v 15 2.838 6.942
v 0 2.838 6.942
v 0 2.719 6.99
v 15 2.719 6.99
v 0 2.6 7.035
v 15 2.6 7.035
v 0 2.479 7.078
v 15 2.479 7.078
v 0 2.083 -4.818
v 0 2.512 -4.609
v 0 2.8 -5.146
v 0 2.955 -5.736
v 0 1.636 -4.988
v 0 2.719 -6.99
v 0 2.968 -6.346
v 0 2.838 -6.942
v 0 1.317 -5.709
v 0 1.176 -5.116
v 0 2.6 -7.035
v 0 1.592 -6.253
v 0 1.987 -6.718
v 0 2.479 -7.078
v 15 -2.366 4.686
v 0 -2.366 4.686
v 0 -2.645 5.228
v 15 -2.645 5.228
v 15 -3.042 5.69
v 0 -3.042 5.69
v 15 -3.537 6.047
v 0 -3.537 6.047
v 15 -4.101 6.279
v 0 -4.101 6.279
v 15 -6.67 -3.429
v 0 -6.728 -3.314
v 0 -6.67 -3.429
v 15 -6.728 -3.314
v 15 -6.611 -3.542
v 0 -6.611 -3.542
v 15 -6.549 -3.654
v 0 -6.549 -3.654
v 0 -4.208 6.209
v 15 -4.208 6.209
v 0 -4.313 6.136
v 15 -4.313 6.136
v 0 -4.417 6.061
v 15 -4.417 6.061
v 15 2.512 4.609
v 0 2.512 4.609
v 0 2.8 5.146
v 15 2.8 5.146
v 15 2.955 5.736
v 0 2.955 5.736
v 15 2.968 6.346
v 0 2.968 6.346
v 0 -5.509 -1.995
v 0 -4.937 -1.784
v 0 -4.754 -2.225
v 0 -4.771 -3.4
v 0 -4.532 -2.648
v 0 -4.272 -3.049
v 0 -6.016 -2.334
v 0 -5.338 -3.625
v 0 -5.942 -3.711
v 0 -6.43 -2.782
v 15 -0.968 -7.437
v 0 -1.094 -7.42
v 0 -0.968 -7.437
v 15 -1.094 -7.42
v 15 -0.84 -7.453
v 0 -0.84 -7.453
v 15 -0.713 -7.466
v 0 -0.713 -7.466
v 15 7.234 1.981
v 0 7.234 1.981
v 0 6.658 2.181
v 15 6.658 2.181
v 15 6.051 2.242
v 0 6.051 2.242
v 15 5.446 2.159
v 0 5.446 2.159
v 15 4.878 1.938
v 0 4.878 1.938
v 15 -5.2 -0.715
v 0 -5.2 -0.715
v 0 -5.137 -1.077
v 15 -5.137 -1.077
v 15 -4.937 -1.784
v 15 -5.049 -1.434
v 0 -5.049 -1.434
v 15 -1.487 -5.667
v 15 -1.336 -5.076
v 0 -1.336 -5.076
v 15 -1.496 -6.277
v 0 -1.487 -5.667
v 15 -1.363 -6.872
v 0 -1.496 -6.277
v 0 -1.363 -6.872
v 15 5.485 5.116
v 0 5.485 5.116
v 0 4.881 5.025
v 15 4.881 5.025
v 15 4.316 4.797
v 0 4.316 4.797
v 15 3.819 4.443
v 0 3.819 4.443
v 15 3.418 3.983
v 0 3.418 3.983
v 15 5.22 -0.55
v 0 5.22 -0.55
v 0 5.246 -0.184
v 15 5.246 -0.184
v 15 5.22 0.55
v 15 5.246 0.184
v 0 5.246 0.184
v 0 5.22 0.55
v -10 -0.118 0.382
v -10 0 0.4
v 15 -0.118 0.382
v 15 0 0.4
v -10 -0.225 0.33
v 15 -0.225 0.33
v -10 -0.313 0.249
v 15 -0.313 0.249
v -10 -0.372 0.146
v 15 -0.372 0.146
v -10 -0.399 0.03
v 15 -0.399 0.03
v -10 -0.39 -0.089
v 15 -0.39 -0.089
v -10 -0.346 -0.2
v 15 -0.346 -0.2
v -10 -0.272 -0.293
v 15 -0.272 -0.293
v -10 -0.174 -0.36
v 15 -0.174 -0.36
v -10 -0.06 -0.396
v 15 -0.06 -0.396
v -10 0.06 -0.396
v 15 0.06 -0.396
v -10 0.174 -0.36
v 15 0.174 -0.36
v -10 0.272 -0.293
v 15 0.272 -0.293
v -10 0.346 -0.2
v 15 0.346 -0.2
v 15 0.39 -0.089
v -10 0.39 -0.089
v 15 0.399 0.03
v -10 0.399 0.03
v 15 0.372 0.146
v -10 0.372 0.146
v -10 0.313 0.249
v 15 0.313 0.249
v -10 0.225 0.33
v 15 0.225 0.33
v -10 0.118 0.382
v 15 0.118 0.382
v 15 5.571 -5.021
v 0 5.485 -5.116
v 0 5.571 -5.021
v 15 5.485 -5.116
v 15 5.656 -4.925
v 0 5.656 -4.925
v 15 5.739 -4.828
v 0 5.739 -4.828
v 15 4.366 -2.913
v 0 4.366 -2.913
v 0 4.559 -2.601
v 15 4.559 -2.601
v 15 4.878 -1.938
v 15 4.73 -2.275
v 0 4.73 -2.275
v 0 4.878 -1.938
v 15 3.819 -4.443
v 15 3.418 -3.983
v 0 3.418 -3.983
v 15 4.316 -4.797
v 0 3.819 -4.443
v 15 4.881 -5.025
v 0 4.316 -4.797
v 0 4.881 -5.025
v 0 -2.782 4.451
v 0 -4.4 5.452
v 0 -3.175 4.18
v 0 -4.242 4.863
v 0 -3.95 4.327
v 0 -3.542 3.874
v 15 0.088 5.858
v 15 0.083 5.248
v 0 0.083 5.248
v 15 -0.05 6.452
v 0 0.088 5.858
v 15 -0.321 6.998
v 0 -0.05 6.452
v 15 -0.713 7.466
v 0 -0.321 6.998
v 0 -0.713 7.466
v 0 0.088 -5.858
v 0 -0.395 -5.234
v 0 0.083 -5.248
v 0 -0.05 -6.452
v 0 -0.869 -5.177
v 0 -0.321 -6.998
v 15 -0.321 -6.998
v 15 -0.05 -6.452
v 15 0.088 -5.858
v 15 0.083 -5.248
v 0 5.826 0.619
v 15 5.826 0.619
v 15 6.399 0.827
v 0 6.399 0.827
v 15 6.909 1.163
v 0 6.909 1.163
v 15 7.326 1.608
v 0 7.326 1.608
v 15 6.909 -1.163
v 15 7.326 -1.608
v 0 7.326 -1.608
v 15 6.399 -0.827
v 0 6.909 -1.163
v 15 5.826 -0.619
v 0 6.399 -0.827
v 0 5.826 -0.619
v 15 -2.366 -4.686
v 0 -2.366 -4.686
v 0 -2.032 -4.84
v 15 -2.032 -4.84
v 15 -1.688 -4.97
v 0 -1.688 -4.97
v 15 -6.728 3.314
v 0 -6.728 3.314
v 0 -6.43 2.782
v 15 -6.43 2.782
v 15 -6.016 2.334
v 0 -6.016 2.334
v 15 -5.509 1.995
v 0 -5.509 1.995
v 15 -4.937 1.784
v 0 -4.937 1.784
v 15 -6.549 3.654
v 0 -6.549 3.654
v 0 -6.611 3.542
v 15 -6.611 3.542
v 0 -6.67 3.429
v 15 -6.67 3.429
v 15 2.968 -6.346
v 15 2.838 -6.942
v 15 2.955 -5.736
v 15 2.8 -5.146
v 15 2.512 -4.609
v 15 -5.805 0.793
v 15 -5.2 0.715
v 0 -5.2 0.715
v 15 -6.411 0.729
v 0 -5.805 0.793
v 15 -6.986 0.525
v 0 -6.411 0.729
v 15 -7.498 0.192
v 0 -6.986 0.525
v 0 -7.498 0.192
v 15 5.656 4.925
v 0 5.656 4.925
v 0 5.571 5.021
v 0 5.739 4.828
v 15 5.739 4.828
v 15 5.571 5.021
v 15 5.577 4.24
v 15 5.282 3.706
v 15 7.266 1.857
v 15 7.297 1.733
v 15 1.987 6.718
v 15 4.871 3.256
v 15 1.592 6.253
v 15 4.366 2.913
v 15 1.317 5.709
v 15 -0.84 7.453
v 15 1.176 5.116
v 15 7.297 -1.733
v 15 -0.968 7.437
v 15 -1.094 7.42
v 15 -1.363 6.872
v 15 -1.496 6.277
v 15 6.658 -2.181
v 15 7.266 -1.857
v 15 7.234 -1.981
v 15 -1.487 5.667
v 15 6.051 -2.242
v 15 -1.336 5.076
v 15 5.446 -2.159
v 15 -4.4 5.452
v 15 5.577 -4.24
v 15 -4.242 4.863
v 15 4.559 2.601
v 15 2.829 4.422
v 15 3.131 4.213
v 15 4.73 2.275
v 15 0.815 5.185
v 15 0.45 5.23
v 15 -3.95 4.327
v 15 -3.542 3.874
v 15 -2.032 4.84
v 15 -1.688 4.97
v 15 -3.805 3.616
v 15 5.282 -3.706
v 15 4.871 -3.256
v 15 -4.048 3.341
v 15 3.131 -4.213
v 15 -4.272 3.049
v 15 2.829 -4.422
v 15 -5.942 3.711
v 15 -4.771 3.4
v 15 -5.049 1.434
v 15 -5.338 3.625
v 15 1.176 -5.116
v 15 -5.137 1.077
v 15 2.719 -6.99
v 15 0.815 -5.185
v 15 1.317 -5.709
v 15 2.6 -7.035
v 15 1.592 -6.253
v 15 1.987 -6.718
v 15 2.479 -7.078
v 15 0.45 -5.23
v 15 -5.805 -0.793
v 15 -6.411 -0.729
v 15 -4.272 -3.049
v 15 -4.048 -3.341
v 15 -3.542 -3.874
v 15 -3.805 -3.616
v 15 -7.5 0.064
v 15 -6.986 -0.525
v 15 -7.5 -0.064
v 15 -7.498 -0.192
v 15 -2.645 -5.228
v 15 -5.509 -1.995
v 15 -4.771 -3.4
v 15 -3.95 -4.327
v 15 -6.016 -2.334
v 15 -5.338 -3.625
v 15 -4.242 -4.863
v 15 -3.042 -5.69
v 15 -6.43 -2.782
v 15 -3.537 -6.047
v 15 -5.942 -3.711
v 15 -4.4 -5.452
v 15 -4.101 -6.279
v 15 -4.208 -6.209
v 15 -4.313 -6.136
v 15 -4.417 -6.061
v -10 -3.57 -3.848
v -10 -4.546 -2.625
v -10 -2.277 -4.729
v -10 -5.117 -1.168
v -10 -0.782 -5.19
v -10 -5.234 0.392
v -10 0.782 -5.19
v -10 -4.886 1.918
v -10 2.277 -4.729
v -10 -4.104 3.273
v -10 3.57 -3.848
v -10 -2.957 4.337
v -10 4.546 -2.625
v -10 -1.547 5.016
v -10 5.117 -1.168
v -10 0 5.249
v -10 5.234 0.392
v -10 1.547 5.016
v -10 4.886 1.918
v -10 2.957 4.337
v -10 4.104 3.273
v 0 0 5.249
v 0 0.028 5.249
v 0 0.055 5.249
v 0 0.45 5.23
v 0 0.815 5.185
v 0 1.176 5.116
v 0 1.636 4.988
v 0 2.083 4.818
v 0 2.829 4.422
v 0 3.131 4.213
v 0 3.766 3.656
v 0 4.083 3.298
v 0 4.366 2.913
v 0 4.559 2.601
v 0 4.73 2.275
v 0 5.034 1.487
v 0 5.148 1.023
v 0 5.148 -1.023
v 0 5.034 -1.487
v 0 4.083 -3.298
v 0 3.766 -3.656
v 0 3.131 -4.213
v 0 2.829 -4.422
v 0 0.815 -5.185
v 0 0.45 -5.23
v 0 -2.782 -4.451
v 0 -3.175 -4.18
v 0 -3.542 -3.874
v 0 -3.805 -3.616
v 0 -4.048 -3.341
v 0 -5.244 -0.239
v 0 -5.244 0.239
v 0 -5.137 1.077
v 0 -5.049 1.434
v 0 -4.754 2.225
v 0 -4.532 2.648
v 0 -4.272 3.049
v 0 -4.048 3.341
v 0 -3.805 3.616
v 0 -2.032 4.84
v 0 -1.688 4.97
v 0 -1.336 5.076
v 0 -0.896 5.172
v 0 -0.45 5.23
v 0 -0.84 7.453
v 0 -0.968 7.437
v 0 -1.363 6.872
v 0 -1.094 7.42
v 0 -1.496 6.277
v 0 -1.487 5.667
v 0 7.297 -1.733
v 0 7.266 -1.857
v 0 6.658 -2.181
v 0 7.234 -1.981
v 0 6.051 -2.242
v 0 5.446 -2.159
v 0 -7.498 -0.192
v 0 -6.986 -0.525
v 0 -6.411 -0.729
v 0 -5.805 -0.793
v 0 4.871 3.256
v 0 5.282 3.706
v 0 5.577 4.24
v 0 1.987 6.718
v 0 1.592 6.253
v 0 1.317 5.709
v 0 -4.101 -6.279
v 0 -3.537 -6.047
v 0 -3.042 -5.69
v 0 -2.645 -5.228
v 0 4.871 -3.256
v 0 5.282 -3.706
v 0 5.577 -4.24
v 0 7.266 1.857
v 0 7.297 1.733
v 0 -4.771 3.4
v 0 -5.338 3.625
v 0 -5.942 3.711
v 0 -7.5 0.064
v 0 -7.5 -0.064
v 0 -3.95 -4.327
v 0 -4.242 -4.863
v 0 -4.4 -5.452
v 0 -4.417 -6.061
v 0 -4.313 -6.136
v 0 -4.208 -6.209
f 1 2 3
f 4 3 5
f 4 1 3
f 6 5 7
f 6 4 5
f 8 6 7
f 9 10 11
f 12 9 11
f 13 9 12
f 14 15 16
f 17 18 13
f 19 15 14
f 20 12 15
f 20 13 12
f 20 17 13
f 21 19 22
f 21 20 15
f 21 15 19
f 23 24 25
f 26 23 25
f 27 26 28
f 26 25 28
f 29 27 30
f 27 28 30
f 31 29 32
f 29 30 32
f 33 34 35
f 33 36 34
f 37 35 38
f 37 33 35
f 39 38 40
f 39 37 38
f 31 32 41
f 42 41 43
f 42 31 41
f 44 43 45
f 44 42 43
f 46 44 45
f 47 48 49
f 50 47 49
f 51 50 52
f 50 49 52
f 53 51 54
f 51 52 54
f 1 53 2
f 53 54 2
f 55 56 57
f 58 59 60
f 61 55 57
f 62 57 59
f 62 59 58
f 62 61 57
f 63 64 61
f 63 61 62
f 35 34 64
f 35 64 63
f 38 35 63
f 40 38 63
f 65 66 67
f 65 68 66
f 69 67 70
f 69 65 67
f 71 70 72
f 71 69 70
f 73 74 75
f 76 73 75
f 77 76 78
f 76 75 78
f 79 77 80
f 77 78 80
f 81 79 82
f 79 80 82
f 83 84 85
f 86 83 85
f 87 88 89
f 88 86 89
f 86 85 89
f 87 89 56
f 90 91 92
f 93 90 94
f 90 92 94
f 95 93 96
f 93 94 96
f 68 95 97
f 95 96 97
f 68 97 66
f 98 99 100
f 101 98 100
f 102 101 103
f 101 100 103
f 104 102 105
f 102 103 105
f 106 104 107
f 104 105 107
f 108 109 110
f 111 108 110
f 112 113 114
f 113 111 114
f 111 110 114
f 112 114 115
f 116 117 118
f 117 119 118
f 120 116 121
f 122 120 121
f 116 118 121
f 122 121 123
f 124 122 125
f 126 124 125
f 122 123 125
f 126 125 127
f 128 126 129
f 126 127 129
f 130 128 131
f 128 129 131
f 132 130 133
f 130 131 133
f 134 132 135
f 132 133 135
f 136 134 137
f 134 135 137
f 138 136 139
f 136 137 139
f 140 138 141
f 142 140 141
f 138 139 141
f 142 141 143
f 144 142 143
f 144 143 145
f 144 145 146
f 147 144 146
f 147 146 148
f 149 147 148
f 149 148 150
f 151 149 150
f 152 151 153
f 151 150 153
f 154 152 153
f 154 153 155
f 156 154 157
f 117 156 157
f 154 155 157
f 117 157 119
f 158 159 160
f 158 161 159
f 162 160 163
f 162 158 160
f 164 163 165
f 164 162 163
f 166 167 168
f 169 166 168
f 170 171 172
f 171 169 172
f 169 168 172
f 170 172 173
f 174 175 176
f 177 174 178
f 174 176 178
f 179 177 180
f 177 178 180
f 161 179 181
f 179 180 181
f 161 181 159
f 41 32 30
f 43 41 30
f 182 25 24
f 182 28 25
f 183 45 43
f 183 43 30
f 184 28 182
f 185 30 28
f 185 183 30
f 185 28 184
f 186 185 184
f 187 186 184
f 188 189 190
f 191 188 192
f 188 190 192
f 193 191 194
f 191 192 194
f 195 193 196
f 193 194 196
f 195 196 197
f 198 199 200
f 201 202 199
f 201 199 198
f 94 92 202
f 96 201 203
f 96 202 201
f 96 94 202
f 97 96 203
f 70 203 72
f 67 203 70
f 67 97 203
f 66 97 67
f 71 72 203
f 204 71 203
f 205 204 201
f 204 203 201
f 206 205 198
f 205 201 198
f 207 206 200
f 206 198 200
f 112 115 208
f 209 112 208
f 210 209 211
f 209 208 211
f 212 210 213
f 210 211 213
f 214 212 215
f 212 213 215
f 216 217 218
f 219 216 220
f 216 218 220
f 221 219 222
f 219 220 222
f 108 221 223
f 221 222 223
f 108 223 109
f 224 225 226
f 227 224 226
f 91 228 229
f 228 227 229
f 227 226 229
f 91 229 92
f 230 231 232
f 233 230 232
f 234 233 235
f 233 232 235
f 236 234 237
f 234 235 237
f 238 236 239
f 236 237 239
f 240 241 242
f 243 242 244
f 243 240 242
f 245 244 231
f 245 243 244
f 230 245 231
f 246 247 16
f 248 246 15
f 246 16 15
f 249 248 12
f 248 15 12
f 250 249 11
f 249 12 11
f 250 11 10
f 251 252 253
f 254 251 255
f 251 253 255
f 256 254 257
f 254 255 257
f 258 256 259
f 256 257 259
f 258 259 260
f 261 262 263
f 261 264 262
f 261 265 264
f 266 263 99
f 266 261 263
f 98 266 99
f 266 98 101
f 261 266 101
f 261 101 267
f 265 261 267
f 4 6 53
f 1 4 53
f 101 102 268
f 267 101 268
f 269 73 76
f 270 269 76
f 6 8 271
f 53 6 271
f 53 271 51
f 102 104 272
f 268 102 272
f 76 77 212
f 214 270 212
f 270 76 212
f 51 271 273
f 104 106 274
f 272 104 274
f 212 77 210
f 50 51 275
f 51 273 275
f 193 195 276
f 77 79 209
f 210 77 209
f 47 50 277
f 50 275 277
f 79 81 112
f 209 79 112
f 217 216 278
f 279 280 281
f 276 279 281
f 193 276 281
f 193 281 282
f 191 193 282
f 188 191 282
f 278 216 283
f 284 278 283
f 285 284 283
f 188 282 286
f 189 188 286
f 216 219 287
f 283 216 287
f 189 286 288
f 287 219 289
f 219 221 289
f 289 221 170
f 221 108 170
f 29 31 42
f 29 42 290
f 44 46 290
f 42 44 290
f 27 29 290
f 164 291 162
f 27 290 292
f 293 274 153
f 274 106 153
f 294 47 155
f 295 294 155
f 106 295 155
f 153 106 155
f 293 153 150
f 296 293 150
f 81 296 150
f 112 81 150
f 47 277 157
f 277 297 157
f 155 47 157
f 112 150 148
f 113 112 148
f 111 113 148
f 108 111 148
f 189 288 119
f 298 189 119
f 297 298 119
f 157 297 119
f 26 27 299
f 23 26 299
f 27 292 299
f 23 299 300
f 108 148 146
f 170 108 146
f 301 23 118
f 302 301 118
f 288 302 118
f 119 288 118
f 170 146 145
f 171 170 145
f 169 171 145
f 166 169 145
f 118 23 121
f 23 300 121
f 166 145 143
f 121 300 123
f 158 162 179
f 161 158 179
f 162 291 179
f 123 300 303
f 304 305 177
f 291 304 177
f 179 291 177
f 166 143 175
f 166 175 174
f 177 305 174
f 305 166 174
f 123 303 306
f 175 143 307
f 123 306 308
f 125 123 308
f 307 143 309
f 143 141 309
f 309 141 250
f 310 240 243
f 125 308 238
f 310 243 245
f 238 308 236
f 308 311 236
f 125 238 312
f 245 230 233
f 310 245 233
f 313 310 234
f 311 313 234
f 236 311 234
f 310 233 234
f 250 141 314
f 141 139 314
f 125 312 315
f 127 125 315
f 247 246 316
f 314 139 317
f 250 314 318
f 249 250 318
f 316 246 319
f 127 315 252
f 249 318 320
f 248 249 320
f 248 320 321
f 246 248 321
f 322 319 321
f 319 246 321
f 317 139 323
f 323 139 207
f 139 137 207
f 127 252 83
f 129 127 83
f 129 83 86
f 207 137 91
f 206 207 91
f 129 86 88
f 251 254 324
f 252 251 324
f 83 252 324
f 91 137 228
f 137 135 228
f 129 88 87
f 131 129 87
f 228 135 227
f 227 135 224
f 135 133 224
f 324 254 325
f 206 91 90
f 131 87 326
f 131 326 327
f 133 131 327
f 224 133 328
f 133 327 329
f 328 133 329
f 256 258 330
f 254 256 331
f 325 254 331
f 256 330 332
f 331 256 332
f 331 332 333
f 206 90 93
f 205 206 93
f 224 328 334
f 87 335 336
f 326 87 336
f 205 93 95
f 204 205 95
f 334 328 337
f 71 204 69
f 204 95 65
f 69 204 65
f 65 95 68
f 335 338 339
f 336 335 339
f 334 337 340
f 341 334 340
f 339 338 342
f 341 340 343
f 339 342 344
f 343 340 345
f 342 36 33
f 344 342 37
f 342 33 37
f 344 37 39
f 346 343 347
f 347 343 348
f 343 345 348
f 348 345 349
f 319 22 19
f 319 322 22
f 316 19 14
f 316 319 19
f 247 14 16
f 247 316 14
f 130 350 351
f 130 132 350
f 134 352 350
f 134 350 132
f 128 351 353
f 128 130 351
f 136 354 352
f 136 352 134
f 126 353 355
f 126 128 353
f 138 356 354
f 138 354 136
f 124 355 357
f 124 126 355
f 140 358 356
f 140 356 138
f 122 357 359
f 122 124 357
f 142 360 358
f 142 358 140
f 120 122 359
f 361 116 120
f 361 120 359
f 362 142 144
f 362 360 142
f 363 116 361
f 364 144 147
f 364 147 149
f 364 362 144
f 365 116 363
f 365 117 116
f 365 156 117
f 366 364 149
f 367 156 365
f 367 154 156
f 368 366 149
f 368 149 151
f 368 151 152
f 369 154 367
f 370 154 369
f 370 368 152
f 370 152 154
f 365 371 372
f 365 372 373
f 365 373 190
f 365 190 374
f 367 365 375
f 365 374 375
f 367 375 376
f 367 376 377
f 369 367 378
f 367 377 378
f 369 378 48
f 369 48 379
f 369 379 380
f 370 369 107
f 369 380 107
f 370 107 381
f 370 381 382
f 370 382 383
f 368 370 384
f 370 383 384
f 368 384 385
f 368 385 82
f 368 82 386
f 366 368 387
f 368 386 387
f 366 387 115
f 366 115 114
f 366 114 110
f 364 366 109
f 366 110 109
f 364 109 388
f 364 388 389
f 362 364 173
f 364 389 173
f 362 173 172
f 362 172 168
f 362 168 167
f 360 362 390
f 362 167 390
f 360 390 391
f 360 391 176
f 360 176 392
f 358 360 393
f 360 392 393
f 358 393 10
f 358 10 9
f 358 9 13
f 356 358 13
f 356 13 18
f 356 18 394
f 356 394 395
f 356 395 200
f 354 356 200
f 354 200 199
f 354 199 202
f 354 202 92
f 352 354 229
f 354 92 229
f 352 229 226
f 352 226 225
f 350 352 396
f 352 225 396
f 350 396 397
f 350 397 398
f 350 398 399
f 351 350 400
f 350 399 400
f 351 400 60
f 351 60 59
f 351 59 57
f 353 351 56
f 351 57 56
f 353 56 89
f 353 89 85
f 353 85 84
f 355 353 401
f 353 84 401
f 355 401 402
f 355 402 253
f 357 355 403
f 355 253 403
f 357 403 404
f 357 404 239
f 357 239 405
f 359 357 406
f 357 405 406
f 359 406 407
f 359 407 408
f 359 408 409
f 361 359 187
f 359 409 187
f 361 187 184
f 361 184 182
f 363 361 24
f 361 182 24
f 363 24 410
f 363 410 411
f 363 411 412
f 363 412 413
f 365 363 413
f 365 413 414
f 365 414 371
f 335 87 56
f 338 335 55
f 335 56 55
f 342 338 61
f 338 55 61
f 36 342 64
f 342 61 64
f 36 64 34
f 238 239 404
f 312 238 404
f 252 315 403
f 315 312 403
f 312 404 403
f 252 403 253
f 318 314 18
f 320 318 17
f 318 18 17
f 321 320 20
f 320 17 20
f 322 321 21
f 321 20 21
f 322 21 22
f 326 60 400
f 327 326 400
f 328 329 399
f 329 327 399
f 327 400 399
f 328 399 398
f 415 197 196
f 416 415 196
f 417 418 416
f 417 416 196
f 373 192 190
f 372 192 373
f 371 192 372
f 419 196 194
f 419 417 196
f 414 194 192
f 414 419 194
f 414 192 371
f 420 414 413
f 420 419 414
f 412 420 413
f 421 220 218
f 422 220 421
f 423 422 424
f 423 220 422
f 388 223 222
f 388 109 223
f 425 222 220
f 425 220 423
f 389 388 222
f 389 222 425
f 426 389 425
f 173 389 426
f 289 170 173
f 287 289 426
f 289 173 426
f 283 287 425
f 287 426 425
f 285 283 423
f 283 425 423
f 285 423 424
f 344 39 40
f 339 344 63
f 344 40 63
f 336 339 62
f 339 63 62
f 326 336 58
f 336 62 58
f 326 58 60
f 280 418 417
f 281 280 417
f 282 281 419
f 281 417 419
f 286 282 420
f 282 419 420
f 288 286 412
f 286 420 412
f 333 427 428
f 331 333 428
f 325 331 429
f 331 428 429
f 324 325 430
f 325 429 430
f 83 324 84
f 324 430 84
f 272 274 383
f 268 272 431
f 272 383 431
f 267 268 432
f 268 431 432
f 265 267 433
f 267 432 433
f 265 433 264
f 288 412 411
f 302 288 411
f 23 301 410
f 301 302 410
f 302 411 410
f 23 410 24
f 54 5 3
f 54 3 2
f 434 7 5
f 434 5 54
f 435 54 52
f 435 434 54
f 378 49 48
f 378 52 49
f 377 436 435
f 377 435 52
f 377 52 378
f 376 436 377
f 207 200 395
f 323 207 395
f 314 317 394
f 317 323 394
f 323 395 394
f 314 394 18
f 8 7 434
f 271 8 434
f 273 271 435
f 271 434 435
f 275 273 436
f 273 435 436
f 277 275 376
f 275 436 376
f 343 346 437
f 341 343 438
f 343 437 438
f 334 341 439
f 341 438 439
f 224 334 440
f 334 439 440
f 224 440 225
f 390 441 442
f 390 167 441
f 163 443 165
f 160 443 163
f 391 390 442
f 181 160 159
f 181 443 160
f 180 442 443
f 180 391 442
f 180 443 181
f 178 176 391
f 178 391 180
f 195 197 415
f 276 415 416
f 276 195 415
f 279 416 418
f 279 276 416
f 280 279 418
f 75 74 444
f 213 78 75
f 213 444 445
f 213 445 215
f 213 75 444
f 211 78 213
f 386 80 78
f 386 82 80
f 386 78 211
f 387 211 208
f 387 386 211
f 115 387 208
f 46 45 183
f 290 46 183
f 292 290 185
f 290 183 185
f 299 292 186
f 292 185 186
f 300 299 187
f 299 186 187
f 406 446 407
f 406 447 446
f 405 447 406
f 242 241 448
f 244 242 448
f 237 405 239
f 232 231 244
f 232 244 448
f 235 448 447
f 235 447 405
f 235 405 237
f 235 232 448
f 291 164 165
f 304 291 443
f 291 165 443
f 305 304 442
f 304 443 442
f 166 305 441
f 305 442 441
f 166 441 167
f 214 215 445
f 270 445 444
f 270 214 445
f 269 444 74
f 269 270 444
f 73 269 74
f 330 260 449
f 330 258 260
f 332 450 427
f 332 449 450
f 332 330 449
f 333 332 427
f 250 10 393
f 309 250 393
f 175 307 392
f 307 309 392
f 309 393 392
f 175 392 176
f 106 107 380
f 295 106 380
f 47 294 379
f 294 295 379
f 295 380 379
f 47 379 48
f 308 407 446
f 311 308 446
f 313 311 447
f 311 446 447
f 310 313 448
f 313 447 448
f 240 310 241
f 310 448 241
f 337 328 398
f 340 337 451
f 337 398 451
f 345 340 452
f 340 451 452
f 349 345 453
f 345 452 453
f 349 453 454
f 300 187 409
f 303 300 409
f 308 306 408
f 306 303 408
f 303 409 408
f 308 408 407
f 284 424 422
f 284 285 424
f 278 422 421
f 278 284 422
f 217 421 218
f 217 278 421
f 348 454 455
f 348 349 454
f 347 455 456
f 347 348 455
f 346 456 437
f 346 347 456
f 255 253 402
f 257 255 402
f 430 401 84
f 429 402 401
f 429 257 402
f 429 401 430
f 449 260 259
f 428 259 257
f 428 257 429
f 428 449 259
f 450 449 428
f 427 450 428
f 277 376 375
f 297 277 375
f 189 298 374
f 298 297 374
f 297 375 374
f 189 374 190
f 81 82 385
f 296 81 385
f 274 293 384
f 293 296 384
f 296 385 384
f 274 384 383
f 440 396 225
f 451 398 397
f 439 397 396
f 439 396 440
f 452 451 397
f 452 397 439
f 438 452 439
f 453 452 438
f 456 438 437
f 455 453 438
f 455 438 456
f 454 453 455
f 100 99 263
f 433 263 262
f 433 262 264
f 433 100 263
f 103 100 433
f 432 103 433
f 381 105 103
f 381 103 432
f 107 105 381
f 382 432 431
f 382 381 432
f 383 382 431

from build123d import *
from build123d.topology import SkipClean

# Parameters (mm, degrees)
BASPROSKE_W      = 15
BASPROSKE_H      = 7.5
TOOTHCUT_DEPTH   = 19.371173071
TEETHCUTS_COUNT  = 13
TEETHCUTS_ANGLE  = 332.307692308
HUBNEAONESKE_R   = 5.249
HUBNEARONE_DEPTH = 10.0000508
BORSKE_R         = 0.4
BORE_DEPTH       = 25.0000508


with BuildPart() as part:
    # BasProSke → Base-Revolve (revolve)
    with BuildSketch(Plane(origin=(0, 0, 0), x_dir=(1, 0, 0), z_dir=(0, 1, 0)), mode=Mode.PRIVATE) as base_revolve_sk:
        with Locations((7.5, 3.75)):
            Rectangle(BASPROSKE_W, BASPROSKE_H)
    revolve(base_revolve_sk.sketch.rotate(Axis((-10, 0, 0), (1, 0, 0)), 180), axis=Axis((-10, 0, 0), (1, 0, 0)))

    # TooCutSke → ToothCut (cut, through all)
    with BuildSketch(Plane(origin=(0, 0, 0), x_dir=(0, 0, -1), z_dir=(1, 0, 0))):
        with BuildLine():
            ThreePointArc((0.550489643, 5.220053846), (0, 5.249), (-0.550489643, 5.220053846))
            ThreePointArc((-0.550489643, 5.220053846), (-0.834571714, 6.414617604), (-1.635166801, 7.345602405))
            ThreePointArc((-1.635166801, 7.345602405), (0, 7.5254), (1.635166801, 7.345602405))
            ThreePointArc((1.635166801, 7.345602405), (0.834571714, 6.414617604), (0.550489643, 5.220053846))
        make_face()
    toothcut = extrude(amount=TOOTHCUT_DEPTH, mode=Mode.SUBTRACT)

    # TeethCuts: ToothCut ×13 about axis
    teethcuts_axis = Axis((-10, 0, 0), (1, 0, 0))
    for i in range(1, TEETHCUTS_COUNT):
        add(toothcut.rotate(teethcuts_axis, i * TEETHCUTS_ANGLE / (TEETHCUTS_COUNT - 1)), mode=Mode.SUBTRACT)

    # HubNeaOneSke → HubNearOne (add)
    with SkipClean():  # the faces are left unmerged after this step: merging them gives an invalid solid
        with BuildSketch(Plane.ZY):
            Circle(HUBNEAONESKE_R)
        extrude(amount=HUBNEARONE_DEPTH)

    # BorSke → Bore (cut, symmetric)
    with SkipClean():  # the faces are left unmerged after this step: merging them gives an invalid solid
        with BuildSketch(Plane(origin=(0, 0, 0), x_dir=(0, 0, -1), z_dir=(1, 0, 0))):
            with Locations(Location((0, 0, 0), (0, 0, 180))):
                Circle(BORSKE_R)
        extrude(amount=BORE_DEPTH, both=True, mode=Mode.SUBTRACT)


solid = part.part
